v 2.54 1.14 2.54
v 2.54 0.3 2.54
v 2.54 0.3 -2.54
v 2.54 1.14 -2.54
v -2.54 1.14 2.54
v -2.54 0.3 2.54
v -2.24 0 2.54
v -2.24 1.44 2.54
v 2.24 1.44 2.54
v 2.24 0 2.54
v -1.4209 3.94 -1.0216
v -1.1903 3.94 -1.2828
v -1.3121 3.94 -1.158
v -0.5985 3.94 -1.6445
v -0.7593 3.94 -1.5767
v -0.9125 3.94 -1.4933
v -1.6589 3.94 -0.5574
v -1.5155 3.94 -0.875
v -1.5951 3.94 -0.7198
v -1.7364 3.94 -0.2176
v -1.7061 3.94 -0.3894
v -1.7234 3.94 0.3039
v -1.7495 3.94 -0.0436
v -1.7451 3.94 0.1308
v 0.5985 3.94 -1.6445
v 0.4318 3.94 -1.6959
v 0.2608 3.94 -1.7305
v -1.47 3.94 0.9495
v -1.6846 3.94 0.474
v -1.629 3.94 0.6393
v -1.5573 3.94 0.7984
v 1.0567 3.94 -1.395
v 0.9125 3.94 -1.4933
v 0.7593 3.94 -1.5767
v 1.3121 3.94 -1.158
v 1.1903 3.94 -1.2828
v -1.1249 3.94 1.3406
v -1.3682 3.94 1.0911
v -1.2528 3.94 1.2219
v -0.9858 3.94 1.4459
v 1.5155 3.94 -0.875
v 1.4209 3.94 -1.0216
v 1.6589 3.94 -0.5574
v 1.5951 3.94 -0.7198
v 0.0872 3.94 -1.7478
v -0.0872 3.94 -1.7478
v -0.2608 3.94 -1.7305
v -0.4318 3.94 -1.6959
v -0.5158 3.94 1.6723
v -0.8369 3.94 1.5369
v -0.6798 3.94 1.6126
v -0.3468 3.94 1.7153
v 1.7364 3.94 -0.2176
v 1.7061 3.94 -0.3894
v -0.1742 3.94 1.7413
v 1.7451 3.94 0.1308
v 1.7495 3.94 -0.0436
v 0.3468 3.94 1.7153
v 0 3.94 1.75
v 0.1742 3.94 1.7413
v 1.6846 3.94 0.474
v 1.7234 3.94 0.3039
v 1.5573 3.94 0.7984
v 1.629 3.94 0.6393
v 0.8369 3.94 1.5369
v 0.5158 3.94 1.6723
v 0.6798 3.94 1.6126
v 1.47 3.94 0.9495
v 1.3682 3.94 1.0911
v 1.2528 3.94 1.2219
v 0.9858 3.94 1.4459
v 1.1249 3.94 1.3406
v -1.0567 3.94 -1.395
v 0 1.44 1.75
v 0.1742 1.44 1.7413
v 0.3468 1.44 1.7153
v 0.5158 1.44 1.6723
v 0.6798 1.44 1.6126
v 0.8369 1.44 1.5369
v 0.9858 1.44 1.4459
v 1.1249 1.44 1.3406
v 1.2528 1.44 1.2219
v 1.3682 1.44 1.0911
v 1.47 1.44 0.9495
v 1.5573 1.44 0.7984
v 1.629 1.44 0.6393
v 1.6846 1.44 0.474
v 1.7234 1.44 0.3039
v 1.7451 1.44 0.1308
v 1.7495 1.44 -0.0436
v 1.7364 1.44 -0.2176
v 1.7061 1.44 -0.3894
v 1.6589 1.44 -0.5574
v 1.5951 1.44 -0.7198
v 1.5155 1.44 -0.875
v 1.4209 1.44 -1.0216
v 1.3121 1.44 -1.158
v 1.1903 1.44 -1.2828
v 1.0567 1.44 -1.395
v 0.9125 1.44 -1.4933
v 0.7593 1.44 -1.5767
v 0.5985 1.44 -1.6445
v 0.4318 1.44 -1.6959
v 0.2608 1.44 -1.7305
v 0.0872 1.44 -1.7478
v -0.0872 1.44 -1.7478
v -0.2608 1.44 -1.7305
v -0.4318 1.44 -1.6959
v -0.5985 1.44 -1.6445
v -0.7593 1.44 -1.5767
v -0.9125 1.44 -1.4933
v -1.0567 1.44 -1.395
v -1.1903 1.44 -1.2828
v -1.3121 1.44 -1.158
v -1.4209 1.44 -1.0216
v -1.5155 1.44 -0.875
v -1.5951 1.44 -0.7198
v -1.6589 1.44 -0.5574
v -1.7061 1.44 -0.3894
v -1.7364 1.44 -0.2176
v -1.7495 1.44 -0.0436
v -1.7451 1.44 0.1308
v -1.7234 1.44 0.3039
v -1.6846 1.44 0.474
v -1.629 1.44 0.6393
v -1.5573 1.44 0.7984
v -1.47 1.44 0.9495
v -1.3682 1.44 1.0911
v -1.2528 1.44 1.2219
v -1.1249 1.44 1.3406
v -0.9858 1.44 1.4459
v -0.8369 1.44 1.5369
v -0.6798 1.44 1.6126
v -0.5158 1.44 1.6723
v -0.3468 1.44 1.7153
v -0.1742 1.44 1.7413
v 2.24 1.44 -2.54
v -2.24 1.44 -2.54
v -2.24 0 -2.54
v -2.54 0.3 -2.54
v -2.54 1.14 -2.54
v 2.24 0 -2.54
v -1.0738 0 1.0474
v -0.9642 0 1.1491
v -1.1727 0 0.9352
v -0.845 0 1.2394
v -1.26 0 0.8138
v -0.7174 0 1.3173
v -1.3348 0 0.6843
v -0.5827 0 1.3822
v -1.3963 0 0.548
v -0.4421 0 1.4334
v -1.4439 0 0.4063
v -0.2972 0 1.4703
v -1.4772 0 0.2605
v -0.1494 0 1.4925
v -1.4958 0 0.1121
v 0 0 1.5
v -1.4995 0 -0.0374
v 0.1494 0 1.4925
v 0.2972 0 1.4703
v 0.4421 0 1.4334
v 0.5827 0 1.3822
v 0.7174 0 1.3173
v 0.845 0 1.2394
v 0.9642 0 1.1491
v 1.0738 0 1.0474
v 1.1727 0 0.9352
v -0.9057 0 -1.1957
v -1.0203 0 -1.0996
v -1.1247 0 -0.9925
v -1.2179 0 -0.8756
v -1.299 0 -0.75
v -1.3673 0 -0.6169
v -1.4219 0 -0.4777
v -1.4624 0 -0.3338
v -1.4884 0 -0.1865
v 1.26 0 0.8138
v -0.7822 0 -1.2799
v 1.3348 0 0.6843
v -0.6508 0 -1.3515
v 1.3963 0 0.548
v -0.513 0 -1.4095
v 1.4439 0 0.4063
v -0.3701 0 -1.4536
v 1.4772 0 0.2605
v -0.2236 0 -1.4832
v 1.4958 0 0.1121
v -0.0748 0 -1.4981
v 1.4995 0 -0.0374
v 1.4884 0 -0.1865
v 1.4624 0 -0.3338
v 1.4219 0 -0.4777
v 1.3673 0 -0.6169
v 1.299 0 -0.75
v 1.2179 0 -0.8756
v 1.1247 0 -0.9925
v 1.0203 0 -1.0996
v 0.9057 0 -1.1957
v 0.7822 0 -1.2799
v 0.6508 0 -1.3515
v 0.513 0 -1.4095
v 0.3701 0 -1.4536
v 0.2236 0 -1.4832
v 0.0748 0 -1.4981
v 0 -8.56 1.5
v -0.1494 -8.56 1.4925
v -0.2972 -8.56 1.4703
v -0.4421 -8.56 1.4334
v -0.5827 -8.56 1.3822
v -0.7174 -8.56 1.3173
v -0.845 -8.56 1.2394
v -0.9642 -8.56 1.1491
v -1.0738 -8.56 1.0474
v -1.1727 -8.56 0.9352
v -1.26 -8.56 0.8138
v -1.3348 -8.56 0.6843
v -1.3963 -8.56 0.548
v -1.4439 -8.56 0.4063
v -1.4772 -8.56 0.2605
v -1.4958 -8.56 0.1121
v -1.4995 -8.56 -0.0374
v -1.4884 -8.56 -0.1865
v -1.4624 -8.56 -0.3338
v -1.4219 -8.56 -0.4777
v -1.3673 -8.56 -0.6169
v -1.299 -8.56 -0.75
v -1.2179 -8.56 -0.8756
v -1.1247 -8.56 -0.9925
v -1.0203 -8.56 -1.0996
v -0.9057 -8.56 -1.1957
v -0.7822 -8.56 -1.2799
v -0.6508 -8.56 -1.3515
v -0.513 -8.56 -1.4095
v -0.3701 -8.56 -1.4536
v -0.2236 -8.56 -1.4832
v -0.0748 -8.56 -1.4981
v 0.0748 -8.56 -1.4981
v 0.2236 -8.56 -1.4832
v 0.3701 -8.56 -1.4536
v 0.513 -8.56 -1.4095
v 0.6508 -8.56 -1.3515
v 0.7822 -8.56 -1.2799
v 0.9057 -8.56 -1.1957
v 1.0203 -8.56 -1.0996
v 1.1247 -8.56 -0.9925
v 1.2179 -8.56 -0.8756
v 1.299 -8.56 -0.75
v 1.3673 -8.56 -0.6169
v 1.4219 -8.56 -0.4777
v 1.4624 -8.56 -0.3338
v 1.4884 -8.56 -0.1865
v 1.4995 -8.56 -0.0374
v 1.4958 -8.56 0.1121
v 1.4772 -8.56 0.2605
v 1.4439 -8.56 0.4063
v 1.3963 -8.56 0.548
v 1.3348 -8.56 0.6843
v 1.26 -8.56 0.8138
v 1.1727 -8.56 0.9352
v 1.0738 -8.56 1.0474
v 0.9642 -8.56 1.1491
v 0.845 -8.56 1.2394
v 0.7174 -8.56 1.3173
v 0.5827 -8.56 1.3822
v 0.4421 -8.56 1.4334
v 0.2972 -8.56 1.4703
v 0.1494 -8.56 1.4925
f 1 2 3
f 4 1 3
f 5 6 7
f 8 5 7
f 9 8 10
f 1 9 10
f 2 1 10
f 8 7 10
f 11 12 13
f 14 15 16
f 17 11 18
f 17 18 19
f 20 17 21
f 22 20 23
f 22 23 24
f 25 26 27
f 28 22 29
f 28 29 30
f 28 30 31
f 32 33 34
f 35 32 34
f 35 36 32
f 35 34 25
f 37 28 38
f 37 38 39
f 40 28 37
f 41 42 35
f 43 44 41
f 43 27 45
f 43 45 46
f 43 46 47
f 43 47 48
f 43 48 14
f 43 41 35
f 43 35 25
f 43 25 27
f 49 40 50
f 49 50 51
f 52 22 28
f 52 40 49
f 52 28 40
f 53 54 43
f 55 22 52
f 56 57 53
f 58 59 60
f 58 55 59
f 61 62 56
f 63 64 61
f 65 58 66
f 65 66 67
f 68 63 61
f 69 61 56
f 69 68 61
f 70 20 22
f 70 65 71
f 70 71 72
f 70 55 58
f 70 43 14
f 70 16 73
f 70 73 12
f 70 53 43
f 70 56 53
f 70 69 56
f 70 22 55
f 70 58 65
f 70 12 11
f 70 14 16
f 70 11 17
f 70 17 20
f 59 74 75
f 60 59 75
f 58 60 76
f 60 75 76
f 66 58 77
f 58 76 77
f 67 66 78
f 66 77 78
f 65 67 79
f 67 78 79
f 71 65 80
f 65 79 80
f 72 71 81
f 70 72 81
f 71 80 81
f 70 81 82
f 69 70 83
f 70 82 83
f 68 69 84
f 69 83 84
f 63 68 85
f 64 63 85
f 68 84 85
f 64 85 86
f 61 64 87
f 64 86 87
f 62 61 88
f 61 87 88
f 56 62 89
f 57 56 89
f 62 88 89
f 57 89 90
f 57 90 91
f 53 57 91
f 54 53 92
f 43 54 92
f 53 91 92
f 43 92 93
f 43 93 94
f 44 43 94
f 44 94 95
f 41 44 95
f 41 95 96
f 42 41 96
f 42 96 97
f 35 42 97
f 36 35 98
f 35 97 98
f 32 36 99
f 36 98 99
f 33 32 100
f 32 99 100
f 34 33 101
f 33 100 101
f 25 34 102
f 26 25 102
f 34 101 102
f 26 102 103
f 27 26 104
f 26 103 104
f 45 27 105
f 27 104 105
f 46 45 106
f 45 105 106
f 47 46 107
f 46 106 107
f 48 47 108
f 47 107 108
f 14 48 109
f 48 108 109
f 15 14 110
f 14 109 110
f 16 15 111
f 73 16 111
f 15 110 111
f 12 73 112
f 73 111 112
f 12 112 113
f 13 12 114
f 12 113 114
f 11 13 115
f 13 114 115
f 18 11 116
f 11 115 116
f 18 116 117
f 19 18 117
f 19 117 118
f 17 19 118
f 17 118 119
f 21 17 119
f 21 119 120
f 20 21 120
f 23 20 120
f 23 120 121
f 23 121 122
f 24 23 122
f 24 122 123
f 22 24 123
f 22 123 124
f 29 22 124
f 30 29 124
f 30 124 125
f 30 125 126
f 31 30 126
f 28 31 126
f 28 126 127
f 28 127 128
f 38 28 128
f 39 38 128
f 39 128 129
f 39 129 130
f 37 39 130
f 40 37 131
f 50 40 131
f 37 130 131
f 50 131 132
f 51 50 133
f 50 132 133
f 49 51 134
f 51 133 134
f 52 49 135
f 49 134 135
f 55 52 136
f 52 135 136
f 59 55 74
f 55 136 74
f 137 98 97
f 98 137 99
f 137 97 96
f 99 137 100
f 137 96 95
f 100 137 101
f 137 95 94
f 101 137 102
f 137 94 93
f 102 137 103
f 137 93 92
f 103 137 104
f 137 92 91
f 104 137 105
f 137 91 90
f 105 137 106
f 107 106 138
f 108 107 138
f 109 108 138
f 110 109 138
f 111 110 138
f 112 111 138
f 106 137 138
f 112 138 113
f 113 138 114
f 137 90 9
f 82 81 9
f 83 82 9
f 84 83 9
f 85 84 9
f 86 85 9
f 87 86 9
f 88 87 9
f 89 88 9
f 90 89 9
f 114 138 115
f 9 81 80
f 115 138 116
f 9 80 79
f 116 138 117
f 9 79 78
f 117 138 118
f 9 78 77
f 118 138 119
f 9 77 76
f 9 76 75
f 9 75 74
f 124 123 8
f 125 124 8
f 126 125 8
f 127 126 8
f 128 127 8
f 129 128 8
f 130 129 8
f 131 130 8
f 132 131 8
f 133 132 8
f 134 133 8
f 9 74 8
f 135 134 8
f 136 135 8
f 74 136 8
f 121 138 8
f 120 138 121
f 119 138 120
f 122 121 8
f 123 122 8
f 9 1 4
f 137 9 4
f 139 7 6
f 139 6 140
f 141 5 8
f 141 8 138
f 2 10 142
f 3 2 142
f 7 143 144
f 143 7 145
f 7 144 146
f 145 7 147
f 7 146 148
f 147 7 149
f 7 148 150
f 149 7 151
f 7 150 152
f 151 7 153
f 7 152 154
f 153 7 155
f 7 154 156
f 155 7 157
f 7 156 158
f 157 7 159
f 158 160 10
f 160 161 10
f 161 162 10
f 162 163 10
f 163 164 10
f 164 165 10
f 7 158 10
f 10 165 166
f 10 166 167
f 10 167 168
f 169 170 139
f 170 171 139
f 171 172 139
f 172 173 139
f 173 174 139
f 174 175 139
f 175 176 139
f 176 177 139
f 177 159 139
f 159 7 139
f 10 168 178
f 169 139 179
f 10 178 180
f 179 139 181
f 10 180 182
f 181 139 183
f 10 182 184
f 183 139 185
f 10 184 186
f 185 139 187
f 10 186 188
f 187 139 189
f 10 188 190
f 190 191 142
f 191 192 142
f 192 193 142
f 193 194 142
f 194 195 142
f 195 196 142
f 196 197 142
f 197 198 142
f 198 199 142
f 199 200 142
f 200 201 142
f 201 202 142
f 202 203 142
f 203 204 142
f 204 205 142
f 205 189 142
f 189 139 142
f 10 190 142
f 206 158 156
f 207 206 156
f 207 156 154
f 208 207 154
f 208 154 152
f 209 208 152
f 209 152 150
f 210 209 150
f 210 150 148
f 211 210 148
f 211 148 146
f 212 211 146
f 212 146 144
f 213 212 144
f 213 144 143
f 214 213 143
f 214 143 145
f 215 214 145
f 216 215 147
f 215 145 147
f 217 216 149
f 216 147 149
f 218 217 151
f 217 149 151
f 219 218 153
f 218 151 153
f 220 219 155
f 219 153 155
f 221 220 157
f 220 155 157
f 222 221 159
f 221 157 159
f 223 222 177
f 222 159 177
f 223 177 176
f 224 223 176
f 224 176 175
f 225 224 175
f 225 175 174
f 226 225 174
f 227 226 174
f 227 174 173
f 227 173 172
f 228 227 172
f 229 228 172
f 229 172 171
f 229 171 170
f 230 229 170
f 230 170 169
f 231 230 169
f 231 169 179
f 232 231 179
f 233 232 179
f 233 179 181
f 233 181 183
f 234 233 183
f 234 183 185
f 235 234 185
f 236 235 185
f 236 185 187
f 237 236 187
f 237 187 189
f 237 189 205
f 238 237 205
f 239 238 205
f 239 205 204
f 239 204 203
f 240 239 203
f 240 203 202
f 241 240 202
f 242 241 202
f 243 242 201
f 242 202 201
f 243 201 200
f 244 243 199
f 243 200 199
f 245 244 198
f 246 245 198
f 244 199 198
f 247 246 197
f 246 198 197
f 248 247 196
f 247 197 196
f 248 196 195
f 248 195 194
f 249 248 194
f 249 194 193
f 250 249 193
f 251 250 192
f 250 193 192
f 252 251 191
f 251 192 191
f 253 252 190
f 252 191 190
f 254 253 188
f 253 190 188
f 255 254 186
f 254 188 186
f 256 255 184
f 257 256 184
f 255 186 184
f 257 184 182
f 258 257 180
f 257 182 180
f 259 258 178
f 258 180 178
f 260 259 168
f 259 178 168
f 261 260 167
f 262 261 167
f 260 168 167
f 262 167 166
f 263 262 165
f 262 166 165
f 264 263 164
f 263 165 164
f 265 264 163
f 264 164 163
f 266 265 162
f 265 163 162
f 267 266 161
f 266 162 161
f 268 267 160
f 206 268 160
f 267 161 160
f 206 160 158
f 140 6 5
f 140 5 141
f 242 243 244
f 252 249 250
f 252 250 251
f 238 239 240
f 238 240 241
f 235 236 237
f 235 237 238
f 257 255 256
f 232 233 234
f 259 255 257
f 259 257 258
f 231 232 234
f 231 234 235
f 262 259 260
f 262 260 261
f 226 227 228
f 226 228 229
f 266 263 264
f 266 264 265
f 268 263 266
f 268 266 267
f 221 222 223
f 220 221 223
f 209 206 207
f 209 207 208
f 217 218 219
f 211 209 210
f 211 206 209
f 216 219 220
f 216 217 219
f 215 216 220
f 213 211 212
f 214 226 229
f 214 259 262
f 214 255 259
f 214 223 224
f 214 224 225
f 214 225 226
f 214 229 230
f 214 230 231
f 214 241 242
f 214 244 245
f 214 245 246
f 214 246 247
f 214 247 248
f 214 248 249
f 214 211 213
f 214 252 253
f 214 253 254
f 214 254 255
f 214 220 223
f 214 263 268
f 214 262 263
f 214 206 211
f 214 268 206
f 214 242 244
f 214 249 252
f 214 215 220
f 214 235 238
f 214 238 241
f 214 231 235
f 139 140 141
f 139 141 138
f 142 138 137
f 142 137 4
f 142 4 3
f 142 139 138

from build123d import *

# Parameters (mm, degrees)
SKETCH1_W           = 5.08
SKETCH1_H           = 5.08
BOSS_EXTRUDE1_DEPTH = 1.44
SKETCH2_R           = 1.5
BOSS_EXTRUDE2_DEPTH = 10
SKETCH3_R           = 1.75
BOSS_EXTRUDE3_DEPTH = 2.5
CHAMFER1_SIZE       = 0.3


with BuildPart() as part:
    # Sketch1 → Boss-Extrude1 (new body)
    with BuildSketch(Plane(origin=(0, 0, 0), x_dir=(1, 0, 0), z_dir=(0, 1, 0))):
        Rectangle(SKETCH1_W, SKETCH1_H)
    extrude(amount=BOSS_EXTRUDE1_DEPTH)

    # Sketch2 → Boss-Extrude2 (add)
    with BuildSketch(Plane.XZ.offset(-1.44)):
        with Locations(Location((0, 0, 0), (0, 0, 90))):
            Circle(SKETCH2_R)
    extrude(amount=BOSS_EXTRUDE2_DEPTH)

    # Sketch3 → Boss-Extrude3 (add)
    with BuildSketch(Plane(origin=(0, 1.44, 0), x_dir=(1, 0, 0), z_dir=(0, 1, 0))):
        with Locations(Location((0, 0, 0), (0, 0, 270))):
            Circle(SKETCH3_R)
    extrude(amount=BOSS_EXTRUDE3_DEPTH)

    # Chamfer1
    chamfer1_edges = [part.edges().sort_by_distance(p)[0] for p in [
        (2.54, 1.44, 0),
        (-2.54, 1.44, 0),
        (2.54, 0, 0),
        (-2.54, 0, 0),
    ]]
    chamfer(chamfer1_edges, length=CHAMFER1_SIZE)


solid = part.part
